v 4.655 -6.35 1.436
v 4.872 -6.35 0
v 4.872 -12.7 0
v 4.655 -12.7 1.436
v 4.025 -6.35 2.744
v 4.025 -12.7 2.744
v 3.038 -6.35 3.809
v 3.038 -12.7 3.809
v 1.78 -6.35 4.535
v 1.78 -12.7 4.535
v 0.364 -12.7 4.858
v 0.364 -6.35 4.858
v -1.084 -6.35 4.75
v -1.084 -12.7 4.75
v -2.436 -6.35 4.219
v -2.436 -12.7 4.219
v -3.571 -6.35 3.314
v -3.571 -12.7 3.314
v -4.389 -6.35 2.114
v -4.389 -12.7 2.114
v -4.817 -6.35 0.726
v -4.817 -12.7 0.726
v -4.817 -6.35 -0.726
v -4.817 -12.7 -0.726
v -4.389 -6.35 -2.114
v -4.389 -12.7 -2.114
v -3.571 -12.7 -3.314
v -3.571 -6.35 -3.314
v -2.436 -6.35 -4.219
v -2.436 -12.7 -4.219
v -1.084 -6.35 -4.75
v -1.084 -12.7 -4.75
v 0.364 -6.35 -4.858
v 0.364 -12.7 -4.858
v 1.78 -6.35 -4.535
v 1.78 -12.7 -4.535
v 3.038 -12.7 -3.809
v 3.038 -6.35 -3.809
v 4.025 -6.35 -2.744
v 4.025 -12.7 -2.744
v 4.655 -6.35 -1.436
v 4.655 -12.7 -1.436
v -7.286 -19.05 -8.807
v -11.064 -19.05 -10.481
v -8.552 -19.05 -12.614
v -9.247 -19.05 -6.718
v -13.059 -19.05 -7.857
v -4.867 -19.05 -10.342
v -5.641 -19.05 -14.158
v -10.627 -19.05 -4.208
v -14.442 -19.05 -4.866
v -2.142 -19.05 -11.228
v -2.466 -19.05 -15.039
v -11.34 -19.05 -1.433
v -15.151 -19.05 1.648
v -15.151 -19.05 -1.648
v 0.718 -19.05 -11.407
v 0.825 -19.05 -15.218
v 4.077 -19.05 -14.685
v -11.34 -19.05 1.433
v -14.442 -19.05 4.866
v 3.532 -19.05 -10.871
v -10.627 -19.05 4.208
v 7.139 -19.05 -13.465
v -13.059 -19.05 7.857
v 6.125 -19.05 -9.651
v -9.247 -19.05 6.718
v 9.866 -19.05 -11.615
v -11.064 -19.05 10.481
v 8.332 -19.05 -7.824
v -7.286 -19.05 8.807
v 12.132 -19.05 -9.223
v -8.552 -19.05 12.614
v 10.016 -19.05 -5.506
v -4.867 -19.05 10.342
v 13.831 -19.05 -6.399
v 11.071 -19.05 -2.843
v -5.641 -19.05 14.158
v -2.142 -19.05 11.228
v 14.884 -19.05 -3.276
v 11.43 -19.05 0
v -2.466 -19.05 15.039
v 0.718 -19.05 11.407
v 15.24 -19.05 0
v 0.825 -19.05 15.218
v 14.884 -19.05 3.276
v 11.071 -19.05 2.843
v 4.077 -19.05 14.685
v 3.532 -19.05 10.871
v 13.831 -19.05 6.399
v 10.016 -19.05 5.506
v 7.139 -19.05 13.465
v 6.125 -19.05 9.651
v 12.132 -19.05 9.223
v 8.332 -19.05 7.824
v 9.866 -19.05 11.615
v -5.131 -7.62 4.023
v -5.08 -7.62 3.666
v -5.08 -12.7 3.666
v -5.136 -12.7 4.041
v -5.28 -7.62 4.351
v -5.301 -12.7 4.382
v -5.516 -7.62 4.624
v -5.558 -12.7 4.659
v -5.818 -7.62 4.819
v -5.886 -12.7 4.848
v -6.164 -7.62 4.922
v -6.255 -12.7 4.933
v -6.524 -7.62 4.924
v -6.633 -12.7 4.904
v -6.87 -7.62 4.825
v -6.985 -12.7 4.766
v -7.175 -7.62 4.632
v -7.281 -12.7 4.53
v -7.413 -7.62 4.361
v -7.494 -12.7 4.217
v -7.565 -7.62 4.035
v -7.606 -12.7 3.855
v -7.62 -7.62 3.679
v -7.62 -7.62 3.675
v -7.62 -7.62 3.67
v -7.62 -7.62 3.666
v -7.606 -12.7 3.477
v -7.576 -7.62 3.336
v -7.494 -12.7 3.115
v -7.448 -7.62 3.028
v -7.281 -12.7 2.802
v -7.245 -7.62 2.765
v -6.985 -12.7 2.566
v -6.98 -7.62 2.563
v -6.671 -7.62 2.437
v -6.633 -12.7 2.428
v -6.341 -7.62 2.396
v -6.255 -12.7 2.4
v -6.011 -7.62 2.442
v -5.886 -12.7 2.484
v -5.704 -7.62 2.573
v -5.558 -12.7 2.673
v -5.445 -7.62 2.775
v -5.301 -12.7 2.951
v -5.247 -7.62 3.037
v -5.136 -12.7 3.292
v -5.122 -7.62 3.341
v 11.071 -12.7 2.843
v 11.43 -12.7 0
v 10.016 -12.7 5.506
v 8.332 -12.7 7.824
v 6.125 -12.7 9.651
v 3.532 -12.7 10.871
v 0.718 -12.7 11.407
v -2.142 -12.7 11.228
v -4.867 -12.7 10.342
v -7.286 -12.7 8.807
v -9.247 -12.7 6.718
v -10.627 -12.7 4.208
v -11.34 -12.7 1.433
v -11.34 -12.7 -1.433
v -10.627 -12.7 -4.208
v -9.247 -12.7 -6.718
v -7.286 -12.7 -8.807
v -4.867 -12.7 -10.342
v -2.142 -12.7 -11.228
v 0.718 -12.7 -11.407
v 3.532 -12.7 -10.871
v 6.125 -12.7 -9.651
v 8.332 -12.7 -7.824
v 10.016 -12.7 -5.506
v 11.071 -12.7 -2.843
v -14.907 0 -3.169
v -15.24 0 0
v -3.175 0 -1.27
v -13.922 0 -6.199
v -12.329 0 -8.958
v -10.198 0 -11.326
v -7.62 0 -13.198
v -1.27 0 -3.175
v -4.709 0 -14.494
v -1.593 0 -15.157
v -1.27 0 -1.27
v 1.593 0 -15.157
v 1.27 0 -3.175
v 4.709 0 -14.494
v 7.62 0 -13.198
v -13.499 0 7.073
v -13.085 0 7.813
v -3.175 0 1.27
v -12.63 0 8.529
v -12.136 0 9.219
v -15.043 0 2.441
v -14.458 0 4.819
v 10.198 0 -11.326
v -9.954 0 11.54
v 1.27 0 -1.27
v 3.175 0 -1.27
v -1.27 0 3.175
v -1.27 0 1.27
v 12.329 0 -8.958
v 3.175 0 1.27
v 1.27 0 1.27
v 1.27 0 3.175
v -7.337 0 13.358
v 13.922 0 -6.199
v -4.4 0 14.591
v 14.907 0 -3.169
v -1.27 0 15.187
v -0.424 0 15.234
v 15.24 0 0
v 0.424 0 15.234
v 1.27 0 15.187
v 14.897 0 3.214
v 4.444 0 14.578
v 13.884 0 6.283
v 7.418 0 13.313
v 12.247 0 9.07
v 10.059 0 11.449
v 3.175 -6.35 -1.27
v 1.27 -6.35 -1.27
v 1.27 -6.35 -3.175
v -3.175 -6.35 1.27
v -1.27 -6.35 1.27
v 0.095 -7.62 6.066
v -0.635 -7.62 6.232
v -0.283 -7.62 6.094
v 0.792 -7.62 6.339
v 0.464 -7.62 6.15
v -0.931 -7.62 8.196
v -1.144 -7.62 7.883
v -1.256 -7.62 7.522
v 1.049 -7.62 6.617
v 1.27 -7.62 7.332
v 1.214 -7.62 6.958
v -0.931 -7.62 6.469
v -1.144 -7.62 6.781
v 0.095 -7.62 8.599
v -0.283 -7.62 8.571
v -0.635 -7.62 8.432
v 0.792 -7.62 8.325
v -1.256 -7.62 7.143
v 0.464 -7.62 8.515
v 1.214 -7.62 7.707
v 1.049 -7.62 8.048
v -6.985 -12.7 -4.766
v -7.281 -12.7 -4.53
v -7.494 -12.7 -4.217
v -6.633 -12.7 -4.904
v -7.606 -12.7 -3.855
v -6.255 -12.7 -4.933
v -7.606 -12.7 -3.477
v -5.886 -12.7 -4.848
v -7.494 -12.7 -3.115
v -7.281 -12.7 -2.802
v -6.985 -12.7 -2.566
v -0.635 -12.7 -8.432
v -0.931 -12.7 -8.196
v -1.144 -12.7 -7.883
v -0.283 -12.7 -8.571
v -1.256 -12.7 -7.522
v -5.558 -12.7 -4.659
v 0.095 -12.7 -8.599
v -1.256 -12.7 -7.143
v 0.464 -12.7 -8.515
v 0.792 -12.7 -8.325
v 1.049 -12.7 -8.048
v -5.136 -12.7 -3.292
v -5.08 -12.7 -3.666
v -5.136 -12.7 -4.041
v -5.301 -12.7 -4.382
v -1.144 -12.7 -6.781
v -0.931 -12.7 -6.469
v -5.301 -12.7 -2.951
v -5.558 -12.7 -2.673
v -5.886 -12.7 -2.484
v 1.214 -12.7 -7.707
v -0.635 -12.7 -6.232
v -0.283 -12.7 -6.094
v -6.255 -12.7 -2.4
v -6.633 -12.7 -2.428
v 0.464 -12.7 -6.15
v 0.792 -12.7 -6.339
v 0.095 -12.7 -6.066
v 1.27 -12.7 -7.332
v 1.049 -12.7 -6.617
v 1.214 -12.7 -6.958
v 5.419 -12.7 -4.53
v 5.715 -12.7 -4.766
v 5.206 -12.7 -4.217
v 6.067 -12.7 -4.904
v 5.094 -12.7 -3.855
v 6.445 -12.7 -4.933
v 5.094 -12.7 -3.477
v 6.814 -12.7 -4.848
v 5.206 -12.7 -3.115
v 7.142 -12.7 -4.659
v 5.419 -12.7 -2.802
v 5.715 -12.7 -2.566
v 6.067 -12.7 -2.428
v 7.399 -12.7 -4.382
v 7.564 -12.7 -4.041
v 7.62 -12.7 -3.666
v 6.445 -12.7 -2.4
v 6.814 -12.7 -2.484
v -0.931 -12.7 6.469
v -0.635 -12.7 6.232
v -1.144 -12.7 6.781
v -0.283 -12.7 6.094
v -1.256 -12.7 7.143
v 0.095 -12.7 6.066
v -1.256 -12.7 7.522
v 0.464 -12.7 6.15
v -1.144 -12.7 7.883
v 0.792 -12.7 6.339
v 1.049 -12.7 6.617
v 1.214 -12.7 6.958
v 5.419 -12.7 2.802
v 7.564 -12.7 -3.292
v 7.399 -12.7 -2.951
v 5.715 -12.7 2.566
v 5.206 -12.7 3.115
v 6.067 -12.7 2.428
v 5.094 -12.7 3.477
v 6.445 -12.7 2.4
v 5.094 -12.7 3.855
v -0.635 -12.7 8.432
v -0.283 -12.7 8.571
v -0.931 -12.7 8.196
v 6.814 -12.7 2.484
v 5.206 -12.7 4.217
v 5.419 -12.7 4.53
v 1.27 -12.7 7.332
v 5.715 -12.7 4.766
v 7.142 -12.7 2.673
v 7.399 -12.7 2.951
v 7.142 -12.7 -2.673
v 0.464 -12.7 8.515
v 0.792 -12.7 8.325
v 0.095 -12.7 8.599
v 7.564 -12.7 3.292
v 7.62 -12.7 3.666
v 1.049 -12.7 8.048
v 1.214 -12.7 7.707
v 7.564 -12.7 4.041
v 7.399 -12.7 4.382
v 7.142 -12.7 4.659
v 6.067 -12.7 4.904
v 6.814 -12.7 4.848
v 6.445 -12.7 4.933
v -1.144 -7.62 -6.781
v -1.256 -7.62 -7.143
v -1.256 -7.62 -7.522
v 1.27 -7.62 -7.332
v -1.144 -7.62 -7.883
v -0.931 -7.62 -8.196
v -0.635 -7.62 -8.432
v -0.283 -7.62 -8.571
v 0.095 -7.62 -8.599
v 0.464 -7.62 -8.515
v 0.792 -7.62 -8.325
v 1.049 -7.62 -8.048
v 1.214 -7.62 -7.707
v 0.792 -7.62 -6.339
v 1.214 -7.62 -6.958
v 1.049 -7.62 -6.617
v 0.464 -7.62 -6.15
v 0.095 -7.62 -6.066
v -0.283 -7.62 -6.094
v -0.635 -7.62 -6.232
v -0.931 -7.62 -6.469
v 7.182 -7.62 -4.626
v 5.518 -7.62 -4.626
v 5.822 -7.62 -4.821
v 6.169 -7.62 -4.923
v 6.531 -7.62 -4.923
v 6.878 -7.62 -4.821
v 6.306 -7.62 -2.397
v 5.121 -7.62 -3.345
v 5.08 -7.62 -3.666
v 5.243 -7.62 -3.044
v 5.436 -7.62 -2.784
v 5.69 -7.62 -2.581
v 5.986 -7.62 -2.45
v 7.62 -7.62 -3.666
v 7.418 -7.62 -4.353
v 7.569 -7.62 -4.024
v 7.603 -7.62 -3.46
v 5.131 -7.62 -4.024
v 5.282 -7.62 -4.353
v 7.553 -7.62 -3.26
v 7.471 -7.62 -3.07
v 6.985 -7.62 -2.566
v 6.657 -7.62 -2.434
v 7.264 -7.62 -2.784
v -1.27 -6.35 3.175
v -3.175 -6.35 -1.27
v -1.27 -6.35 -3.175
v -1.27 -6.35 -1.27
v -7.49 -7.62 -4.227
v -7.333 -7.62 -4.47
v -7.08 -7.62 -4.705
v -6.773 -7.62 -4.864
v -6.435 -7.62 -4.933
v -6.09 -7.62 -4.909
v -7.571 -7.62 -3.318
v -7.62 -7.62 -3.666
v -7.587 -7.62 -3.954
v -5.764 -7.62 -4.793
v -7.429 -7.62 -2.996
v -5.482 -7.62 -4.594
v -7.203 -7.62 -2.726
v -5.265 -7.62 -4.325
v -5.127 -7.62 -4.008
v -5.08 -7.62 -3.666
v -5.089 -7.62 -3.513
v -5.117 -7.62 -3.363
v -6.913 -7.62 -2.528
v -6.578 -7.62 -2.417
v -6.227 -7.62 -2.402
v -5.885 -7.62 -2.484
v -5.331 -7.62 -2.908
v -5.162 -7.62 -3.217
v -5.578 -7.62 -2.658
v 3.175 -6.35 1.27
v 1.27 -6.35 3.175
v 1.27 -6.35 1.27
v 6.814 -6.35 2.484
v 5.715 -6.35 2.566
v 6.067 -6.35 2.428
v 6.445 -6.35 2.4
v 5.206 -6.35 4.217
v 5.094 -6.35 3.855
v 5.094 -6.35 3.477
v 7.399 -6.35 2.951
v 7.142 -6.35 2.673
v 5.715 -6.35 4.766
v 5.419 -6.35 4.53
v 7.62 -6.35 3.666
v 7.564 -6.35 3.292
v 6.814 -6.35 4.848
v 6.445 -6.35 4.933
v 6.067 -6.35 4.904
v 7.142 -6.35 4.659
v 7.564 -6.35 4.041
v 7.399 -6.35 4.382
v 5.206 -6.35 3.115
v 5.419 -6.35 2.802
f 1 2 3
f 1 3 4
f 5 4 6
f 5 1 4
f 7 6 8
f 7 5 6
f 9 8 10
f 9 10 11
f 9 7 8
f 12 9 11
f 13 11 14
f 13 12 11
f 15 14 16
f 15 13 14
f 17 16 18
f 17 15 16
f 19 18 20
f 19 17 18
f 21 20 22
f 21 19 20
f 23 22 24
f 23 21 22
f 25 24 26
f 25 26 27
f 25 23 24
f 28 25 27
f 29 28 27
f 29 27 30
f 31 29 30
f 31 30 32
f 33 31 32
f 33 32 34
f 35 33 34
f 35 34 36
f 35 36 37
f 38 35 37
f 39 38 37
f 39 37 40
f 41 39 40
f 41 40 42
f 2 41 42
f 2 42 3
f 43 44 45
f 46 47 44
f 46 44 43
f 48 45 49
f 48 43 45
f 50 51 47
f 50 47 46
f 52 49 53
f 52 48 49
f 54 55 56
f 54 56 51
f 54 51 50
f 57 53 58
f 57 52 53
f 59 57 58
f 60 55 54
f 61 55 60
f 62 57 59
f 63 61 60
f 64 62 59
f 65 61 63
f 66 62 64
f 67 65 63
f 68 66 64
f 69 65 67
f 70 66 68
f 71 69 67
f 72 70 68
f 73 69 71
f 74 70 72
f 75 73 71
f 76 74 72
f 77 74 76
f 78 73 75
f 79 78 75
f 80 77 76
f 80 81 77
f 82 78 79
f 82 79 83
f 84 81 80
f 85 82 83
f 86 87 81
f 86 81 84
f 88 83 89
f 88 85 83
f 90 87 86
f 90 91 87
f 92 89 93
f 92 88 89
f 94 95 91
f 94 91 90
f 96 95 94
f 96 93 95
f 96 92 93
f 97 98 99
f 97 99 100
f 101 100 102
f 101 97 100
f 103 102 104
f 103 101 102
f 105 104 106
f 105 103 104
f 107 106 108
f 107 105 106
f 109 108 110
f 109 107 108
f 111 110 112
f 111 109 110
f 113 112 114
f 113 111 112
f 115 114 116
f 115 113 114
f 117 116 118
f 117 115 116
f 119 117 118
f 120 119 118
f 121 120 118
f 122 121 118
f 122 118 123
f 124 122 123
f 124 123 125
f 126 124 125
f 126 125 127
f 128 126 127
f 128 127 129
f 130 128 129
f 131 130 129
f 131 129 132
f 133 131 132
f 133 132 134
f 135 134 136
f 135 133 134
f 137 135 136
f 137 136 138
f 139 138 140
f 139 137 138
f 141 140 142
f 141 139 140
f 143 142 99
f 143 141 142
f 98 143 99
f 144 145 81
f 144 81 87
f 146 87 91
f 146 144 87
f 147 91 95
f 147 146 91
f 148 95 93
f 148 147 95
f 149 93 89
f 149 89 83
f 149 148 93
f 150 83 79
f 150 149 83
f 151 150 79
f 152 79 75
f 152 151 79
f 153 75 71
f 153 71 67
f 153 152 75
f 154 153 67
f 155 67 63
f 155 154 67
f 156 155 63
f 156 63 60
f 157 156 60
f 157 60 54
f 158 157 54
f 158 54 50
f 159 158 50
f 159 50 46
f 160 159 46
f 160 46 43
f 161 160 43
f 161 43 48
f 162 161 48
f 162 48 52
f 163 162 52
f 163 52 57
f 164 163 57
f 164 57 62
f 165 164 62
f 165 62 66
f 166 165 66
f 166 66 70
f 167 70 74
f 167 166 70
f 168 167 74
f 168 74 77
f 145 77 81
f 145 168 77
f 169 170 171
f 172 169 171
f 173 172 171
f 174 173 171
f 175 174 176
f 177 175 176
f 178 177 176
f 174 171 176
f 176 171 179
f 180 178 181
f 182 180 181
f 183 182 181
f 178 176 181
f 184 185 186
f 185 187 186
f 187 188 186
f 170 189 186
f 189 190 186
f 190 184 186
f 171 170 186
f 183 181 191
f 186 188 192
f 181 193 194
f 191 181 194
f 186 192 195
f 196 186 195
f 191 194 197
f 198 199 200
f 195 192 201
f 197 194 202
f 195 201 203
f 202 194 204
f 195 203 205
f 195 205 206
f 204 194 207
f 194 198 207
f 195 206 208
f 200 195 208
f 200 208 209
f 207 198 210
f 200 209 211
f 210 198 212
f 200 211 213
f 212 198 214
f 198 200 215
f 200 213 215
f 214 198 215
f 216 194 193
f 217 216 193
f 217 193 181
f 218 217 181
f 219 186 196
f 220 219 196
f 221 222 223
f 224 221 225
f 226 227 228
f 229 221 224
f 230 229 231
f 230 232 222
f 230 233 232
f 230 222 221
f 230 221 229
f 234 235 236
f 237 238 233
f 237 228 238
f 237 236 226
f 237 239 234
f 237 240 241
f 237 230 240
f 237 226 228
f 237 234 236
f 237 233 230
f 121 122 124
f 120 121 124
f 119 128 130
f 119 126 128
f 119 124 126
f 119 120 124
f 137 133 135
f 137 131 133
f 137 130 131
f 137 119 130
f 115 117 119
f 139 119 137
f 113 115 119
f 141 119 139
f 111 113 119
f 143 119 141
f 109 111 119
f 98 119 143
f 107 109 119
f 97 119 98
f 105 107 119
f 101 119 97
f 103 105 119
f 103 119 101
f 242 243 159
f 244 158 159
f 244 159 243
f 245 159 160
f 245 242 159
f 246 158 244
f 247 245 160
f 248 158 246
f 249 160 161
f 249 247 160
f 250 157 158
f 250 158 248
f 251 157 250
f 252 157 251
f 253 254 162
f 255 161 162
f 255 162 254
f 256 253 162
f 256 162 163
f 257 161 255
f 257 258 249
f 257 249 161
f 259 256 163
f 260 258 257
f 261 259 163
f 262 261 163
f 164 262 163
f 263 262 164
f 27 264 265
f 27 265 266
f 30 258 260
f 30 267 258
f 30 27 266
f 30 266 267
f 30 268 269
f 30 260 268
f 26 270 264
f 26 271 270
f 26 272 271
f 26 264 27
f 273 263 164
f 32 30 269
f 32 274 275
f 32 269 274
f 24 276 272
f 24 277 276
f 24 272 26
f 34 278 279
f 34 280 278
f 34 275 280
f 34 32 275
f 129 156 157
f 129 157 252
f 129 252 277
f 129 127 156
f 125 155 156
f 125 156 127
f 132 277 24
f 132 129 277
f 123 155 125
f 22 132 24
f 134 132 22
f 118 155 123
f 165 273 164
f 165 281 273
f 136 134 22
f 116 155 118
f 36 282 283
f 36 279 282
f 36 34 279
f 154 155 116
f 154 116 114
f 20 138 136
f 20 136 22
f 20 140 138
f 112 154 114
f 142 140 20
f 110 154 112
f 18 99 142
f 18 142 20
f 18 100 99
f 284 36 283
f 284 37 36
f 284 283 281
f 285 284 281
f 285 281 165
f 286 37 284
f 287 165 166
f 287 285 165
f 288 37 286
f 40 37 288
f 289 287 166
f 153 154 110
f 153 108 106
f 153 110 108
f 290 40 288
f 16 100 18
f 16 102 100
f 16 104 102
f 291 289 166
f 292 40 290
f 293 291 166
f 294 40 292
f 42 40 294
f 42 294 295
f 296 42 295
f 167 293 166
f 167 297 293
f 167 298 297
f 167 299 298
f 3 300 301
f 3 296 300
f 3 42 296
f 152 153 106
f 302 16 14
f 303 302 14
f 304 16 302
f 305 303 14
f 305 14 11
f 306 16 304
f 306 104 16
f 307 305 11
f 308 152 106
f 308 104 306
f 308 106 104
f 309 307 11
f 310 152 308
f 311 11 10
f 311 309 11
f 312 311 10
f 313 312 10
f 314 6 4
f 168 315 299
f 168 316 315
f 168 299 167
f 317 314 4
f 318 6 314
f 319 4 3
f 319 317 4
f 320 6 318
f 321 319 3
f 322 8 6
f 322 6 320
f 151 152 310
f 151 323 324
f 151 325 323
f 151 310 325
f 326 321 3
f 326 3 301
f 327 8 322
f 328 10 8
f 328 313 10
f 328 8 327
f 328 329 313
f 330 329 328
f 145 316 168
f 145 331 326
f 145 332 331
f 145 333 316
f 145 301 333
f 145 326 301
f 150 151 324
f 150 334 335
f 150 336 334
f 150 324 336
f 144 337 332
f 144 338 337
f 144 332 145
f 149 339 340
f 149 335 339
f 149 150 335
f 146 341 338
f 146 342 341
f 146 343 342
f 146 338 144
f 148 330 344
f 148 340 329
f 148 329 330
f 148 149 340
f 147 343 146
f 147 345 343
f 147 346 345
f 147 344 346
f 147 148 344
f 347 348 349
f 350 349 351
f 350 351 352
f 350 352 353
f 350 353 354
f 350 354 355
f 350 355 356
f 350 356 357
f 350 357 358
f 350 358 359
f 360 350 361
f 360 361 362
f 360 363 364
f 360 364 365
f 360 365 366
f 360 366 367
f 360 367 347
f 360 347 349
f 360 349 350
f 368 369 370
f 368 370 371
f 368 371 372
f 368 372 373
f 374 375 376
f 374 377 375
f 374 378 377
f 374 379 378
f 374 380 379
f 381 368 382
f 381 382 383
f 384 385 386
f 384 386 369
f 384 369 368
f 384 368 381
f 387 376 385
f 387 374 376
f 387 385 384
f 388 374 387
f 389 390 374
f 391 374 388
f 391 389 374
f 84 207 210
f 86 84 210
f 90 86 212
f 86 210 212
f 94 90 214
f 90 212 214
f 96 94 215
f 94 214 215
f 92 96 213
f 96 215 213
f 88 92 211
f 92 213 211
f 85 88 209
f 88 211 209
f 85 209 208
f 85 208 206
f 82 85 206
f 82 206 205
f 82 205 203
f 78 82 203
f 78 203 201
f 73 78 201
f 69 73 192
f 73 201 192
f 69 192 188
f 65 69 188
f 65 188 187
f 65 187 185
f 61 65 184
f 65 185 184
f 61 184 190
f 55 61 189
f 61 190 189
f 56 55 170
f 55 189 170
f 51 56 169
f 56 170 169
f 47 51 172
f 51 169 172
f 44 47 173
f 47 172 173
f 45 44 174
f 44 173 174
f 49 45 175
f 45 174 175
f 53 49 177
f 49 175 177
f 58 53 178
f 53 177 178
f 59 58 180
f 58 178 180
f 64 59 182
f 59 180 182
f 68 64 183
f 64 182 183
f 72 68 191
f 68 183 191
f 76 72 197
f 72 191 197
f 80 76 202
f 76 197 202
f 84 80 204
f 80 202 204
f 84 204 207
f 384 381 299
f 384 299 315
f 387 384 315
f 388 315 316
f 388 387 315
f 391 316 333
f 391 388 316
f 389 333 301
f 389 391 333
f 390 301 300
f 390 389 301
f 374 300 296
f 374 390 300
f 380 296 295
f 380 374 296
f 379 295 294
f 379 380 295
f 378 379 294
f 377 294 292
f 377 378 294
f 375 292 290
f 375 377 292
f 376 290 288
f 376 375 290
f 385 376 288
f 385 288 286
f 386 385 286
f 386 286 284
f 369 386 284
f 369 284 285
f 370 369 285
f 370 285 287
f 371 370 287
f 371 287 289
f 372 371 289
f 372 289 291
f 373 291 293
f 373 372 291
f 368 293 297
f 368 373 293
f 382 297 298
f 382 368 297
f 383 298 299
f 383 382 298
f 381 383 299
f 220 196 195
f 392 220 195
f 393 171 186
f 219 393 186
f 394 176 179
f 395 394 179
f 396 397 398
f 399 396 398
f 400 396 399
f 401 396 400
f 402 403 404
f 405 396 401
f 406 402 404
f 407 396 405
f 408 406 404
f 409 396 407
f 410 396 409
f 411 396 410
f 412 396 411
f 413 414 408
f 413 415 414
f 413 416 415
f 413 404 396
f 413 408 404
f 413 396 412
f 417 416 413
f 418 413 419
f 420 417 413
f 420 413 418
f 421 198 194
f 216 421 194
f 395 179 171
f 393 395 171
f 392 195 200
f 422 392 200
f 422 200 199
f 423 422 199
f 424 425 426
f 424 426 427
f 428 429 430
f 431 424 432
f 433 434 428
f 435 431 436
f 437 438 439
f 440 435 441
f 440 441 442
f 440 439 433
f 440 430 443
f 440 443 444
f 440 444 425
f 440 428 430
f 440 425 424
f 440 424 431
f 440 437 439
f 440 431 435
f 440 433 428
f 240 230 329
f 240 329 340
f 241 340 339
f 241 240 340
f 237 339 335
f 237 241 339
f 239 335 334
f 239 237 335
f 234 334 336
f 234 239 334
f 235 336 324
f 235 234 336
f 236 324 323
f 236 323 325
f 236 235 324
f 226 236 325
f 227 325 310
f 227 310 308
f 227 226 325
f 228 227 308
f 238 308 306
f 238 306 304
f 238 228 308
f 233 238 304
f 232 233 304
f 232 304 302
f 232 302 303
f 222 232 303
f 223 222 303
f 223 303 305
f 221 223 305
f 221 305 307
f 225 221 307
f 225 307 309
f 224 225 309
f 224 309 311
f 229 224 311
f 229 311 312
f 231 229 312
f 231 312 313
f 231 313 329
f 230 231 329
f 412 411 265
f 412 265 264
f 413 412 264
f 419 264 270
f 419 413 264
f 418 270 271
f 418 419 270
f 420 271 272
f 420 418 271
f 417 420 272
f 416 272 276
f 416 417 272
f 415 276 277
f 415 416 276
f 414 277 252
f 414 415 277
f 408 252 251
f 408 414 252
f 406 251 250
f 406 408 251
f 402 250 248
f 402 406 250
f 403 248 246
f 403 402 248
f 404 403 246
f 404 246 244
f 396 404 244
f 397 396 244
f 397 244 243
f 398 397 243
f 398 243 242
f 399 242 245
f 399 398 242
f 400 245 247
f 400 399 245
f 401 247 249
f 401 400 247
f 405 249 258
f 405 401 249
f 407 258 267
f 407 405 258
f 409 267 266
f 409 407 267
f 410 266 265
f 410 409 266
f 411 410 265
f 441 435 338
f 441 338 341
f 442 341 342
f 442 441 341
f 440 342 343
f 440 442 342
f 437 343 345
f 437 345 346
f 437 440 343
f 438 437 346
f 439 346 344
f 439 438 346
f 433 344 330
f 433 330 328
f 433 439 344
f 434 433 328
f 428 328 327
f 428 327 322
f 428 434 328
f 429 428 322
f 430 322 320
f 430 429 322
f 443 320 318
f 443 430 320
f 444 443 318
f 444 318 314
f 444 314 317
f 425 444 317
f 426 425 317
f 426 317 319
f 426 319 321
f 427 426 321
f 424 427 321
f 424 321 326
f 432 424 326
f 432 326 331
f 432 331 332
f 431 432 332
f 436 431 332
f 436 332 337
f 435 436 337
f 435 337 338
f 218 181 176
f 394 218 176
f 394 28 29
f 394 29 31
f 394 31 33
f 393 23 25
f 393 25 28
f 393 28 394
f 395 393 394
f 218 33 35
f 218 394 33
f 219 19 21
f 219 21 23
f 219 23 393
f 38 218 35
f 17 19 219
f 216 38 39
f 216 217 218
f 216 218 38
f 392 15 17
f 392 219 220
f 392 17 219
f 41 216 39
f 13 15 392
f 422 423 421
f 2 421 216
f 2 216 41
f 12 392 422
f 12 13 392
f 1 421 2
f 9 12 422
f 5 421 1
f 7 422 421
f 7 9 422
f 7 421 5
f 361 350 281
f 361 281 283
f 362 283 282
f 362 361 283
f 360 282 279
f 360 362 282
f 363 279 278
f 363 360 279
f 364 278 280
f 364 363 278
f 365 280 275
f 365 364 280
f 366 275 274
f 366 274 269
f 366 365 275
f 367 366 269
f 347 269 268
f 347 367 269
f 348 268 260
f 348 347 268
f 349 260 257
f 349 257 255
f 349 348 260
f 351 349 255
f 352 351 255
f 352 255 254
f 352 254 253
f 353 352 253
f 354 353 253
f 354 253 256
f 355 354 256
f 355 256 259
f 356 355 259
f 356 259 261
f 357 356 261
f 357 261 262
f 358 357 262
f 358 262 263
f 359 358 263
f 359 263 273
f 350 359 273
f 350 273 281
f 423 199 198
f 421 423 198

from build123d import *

# Parameters (mm, degrees)
F0_R     = 15.24
F0_R_2   = 12.7
F0_R_3   = 11.43
F1_DEPTH = 19.05
F0_R_4   = 1.27
F0_R_5   = 4.8718647292
F2_DEPTH = 12.7
F3_DEPTH = 6.35
F5_DEPTH = 7.62


# Not quite as in the source:
# - a feature of the source that left no trace in its solid (it failed there, or was rolled back) is left out
# - the program builds the solid bodies; features that only make, move or delete a surface that nothing else refers to are left out


with BuildPart() as f1:
    # F0 (on Front) → F1 (new body)
    with BuildSketch(Plane.XZ):
        Circle(F0_R)
        Circle(F0_R_2, mode=Mode.SUBTRACT)
        Circle(F0_R_2)
        Circle(F0_R_3, mode=Mode.SUBTRACT)
    extrude(amount=F1_DEPTH)

    # F0 (on Front) → F2 (join)
    with BuildSketch(Plane.XZ):
        Circle(F0_R_3)
        with Locations((-6.35, -3.6661742094)):
            Circle(F0_R_4, mode=Mode.SUBTRACT)
        with Locations((0, -7.3323484187)):
            Circle(F0_R_4, mode=Mode.SUBTRACT)
        with Locations((6.35, -3.6661742094)):
            Circle(F0_R_4, mode=Mode.SUBTRACT)
        with Locations((-6.35, 3.6661742094)):
            Circle(F0_R_4, mode=Mode.SUBTRACT)
        Circle(F0_R_5, mode=Mode.SUBTRACT)
        with Locations((6.35, 3.6661742094)):
            Circle(F0_R_4, mode=Mode.SUBTRACT)
        with Locations((0, 7.3323484187)):
            Circle(F0_R_4, mode=Mode.SUBTRACT)
    extrude(amount=F2_DEPTH)

    # F0 (on Front) → F3 (join)
    with BuildSketch(Plane.XZ):
        Circle(F0_R_5)
        Polygon((3.175, 1.27), (3.175, -1.27), (1.27, -1.27), (1.27, -3.175), (-1.27, -3.175), (-1.27, -1.27), (-3.175, -1.27), (-3.175, 1.27), (-1.27, 1.27), (-1.27, 3.175), (1.27, 3.175), (1.27, 1.27), align=None, mode=Mode.SUBTRACT)
        with Locations((6.35, 3.6661742094)):
            Circle(F0_R_4)
    extrude(amount=F3_DEPTH)

    # F0 (on Front) + F4 (on face) → F5 (join)
    with BuildSketch(Plane.XZ):
        with Locations((0, 7.3323484187)):
            Circle(F0_R_4)
        with Locations((6.35, -3.6661742094)):
            Circle(F0_R_4)
        with Locations((0, -7.3323484187)):
            Circle(F0_R_4)
        with Locations((-6.35, -3.6661742094)):
            Circle(F0_R_4)
        with Locations((-6.35, 3.6661742094)):
            Circle(F0_R_4)
    with BuildSketch(Plane(origin=(0, 0, 0), x_dir=(-1, 0, 0), z_dir=(0, 1, 0))):
        with BuildLine():
            ThreePointArc((-1.27, 7.3323484187), (0, 6.0623484187), (1.27, 7.3323484187))
            ThreePointArc((1.27, 7.3323484187), (0, 8.6023484187), (-1.27, 7.3323484187))
        make_face()
        with BuildLine():
            ThreePointArc((7.61993774, 3.678749442), (5.715, 4.7660264722), (5.7041406591, 2.5726634816))
            Line((5.7041406591, 2.5726634816), (7.61993774, 3.678749442))
        make_face()
        with BuildLine():
            Line((7.61993774, 3.678749442), (5.7041406591, 2.5726634816))
            ThreePointArc((5.7041406591, 2.5726634816), (6.9795469153, 2.5631915796), (7.62, 3.6661742094))
            ThreePointArc((7.62, 3.6661742094), (7.6199844349, 3.6724619027), (7.61993774, 3.678749442))
        make_face()
        with BuildLine():
            ThreePointArc((-1.27, 12.6363404513), (0, 12.7), (1.27, 12.6363404513))
            Line((1.27, 12.6363404513), (1.27, 15.1869911437))
            ThreePointArc((1.27, 15.1869911437), (0, 15.24), (-1.27, 15.1869911437))
            Line((-1.27, 15.1869911437), (-1.27, 12.6363404513))
        make_face()
        with BuildLine():
            Line((1.27, 15.1869911437), (1.27, 12.6363404513))
            ThreePointArc((1.27, 12.6363404513), (6.0659933949, 11.1576755703), (9.9146853041, 7.9365619333))
            Line((9.9146853041, 7.9365619333), (12.1355541331, 9.2187811496))
            ThreePointArc((12.1355541331, 9.2187811496), (7.3370363933, 13.3576007188), (1.27, 15.1869911437))
        make_face()
        with BuildLine():
            ThreePointArc((-11.4830868745, 5.4248240371), (-10.8829390696, 6.5461161927), (-10.1736532809, 7.6017615668))
            ThreePointArc((-10.1736532809, 7.6017615668), (-6.2510836052, 11.0550420063), (-1.27, 12.6363404513))
            Line((-1.27, 12.6363404513), (-1.27, 15.1869911437))
            ThreePointArc((-1.27, 15.1869911437), (-10.3175287739, -11.2163363002), (15.24, 0))
            ThreePointArc((15.24, 0), (14.7984009497, 3.6421050686), (13.4991956259, 7.0731405651))
            Line((13.4991956259, 7.0731405651), (11.2972745003, 5.8018608105))
            ThreePointArc((11.2972745003, 5.8018608105), (12.344338503, 2.9845111698), (12.7, 0))
            ThreePointArc((12.7, 0), (12.5183628333, -2.1402317572), (11.9786469332, -4.2192437297))
            ThreePointArc((11.9786469332, -4.2192437297), (11.4947402206, -5.4000877087), (10.8947701838, -6.5264065642))
            ThreePointArc((10.8947701838, -6.5264065642), (7.1599884636, -10.4892595163), (2.108859222, -12.5236860701))
            ThreePointArc((2.108859222, -12.5236860701), (0.843104089, -12.6719838816), (-0.431140778, -12.6926796867))
            ThreePointArc((-0.431140778, -12.6926796867), (-5.8966986399, -11.2480640623), (-10.1938394294, -7.5746707973))
            ThreePointArc((-10.1938394294, -7.5746707973), (-10.9002856113, -6.5171906211), (-11.4974295134, -5.3943595157))
            ThreePointArc((-11.4974295134, -5.3943595157), (-12.6999888406, 0.0168359612), (-11.4830868745, 5.4248240371))
        make_face()
        with BuildLine():
            Line((12.1355541331, 9.2187811496), (9.9146853041, 7.9365619333))
            ThreePointArc((9.9146853041, 7.9365619333), (10.6595519093, 6.9039085374), (11.2972745003, 5.8018608105))
            Line((11.2972745003, 5.8018608105), (13.4991956259, 7.0731405651))
            ThreePointArc((13.4991956259, 7.0731405651), (12.8621942988, 8.1744454135), (12.1355541331, 9.2187811496))
        make_face()
        with BuildLine():
            ThreePointArc((7.62, -3.6661742094), (6.5784622338, -2.4168924126), (5.1621968382, -3.2167038))
            Line((5.1621968382, -3.2167038), (7.3331543737, -4.4701067174))
            ThreePointArc((7.3331543737, -4.4701067174), (7.5461408894, -4.0929610094), (7.62, -3.6661742094))
        make_face()
        with BuildLine():
            Line((7.3331543737, -4.4701067174), (5.1621968382, -3.2167038))
            ThreePointArc((5.1621968382, -3.2167038), (5.715, -4.7660264722), (7.3331543737, -4.4701067174))
        make_face()
        with BuildLine():
            ThreePointArc((-5.08, -3.6661742094), (-5.4364655228, -2.7839300487), (-6.305755526, -2.3969451416))
            Line((-6.305755526, -2.3969451416), (-7.4713068529, -3.0698765139))
            ThreePointArc((-7.4713068529, -3.0698765139), (-6.6572786169, -4.8984403541), (-5.08, -3.6661742094))
        make_face()
        with BuildLine():
            Line((-7.4713068529, -3.0698765139), (-6.305755526, -2.3969451416))
            ThreePointArc((-6.305755526, -2.3969451416), (-6.985, -2.5663219465), (-7.4713068529, -3.0698765139))
        make_face()
    extrude(amount=F5_DEPTH, dir=(0, -1, 0))


solid = f1.part
